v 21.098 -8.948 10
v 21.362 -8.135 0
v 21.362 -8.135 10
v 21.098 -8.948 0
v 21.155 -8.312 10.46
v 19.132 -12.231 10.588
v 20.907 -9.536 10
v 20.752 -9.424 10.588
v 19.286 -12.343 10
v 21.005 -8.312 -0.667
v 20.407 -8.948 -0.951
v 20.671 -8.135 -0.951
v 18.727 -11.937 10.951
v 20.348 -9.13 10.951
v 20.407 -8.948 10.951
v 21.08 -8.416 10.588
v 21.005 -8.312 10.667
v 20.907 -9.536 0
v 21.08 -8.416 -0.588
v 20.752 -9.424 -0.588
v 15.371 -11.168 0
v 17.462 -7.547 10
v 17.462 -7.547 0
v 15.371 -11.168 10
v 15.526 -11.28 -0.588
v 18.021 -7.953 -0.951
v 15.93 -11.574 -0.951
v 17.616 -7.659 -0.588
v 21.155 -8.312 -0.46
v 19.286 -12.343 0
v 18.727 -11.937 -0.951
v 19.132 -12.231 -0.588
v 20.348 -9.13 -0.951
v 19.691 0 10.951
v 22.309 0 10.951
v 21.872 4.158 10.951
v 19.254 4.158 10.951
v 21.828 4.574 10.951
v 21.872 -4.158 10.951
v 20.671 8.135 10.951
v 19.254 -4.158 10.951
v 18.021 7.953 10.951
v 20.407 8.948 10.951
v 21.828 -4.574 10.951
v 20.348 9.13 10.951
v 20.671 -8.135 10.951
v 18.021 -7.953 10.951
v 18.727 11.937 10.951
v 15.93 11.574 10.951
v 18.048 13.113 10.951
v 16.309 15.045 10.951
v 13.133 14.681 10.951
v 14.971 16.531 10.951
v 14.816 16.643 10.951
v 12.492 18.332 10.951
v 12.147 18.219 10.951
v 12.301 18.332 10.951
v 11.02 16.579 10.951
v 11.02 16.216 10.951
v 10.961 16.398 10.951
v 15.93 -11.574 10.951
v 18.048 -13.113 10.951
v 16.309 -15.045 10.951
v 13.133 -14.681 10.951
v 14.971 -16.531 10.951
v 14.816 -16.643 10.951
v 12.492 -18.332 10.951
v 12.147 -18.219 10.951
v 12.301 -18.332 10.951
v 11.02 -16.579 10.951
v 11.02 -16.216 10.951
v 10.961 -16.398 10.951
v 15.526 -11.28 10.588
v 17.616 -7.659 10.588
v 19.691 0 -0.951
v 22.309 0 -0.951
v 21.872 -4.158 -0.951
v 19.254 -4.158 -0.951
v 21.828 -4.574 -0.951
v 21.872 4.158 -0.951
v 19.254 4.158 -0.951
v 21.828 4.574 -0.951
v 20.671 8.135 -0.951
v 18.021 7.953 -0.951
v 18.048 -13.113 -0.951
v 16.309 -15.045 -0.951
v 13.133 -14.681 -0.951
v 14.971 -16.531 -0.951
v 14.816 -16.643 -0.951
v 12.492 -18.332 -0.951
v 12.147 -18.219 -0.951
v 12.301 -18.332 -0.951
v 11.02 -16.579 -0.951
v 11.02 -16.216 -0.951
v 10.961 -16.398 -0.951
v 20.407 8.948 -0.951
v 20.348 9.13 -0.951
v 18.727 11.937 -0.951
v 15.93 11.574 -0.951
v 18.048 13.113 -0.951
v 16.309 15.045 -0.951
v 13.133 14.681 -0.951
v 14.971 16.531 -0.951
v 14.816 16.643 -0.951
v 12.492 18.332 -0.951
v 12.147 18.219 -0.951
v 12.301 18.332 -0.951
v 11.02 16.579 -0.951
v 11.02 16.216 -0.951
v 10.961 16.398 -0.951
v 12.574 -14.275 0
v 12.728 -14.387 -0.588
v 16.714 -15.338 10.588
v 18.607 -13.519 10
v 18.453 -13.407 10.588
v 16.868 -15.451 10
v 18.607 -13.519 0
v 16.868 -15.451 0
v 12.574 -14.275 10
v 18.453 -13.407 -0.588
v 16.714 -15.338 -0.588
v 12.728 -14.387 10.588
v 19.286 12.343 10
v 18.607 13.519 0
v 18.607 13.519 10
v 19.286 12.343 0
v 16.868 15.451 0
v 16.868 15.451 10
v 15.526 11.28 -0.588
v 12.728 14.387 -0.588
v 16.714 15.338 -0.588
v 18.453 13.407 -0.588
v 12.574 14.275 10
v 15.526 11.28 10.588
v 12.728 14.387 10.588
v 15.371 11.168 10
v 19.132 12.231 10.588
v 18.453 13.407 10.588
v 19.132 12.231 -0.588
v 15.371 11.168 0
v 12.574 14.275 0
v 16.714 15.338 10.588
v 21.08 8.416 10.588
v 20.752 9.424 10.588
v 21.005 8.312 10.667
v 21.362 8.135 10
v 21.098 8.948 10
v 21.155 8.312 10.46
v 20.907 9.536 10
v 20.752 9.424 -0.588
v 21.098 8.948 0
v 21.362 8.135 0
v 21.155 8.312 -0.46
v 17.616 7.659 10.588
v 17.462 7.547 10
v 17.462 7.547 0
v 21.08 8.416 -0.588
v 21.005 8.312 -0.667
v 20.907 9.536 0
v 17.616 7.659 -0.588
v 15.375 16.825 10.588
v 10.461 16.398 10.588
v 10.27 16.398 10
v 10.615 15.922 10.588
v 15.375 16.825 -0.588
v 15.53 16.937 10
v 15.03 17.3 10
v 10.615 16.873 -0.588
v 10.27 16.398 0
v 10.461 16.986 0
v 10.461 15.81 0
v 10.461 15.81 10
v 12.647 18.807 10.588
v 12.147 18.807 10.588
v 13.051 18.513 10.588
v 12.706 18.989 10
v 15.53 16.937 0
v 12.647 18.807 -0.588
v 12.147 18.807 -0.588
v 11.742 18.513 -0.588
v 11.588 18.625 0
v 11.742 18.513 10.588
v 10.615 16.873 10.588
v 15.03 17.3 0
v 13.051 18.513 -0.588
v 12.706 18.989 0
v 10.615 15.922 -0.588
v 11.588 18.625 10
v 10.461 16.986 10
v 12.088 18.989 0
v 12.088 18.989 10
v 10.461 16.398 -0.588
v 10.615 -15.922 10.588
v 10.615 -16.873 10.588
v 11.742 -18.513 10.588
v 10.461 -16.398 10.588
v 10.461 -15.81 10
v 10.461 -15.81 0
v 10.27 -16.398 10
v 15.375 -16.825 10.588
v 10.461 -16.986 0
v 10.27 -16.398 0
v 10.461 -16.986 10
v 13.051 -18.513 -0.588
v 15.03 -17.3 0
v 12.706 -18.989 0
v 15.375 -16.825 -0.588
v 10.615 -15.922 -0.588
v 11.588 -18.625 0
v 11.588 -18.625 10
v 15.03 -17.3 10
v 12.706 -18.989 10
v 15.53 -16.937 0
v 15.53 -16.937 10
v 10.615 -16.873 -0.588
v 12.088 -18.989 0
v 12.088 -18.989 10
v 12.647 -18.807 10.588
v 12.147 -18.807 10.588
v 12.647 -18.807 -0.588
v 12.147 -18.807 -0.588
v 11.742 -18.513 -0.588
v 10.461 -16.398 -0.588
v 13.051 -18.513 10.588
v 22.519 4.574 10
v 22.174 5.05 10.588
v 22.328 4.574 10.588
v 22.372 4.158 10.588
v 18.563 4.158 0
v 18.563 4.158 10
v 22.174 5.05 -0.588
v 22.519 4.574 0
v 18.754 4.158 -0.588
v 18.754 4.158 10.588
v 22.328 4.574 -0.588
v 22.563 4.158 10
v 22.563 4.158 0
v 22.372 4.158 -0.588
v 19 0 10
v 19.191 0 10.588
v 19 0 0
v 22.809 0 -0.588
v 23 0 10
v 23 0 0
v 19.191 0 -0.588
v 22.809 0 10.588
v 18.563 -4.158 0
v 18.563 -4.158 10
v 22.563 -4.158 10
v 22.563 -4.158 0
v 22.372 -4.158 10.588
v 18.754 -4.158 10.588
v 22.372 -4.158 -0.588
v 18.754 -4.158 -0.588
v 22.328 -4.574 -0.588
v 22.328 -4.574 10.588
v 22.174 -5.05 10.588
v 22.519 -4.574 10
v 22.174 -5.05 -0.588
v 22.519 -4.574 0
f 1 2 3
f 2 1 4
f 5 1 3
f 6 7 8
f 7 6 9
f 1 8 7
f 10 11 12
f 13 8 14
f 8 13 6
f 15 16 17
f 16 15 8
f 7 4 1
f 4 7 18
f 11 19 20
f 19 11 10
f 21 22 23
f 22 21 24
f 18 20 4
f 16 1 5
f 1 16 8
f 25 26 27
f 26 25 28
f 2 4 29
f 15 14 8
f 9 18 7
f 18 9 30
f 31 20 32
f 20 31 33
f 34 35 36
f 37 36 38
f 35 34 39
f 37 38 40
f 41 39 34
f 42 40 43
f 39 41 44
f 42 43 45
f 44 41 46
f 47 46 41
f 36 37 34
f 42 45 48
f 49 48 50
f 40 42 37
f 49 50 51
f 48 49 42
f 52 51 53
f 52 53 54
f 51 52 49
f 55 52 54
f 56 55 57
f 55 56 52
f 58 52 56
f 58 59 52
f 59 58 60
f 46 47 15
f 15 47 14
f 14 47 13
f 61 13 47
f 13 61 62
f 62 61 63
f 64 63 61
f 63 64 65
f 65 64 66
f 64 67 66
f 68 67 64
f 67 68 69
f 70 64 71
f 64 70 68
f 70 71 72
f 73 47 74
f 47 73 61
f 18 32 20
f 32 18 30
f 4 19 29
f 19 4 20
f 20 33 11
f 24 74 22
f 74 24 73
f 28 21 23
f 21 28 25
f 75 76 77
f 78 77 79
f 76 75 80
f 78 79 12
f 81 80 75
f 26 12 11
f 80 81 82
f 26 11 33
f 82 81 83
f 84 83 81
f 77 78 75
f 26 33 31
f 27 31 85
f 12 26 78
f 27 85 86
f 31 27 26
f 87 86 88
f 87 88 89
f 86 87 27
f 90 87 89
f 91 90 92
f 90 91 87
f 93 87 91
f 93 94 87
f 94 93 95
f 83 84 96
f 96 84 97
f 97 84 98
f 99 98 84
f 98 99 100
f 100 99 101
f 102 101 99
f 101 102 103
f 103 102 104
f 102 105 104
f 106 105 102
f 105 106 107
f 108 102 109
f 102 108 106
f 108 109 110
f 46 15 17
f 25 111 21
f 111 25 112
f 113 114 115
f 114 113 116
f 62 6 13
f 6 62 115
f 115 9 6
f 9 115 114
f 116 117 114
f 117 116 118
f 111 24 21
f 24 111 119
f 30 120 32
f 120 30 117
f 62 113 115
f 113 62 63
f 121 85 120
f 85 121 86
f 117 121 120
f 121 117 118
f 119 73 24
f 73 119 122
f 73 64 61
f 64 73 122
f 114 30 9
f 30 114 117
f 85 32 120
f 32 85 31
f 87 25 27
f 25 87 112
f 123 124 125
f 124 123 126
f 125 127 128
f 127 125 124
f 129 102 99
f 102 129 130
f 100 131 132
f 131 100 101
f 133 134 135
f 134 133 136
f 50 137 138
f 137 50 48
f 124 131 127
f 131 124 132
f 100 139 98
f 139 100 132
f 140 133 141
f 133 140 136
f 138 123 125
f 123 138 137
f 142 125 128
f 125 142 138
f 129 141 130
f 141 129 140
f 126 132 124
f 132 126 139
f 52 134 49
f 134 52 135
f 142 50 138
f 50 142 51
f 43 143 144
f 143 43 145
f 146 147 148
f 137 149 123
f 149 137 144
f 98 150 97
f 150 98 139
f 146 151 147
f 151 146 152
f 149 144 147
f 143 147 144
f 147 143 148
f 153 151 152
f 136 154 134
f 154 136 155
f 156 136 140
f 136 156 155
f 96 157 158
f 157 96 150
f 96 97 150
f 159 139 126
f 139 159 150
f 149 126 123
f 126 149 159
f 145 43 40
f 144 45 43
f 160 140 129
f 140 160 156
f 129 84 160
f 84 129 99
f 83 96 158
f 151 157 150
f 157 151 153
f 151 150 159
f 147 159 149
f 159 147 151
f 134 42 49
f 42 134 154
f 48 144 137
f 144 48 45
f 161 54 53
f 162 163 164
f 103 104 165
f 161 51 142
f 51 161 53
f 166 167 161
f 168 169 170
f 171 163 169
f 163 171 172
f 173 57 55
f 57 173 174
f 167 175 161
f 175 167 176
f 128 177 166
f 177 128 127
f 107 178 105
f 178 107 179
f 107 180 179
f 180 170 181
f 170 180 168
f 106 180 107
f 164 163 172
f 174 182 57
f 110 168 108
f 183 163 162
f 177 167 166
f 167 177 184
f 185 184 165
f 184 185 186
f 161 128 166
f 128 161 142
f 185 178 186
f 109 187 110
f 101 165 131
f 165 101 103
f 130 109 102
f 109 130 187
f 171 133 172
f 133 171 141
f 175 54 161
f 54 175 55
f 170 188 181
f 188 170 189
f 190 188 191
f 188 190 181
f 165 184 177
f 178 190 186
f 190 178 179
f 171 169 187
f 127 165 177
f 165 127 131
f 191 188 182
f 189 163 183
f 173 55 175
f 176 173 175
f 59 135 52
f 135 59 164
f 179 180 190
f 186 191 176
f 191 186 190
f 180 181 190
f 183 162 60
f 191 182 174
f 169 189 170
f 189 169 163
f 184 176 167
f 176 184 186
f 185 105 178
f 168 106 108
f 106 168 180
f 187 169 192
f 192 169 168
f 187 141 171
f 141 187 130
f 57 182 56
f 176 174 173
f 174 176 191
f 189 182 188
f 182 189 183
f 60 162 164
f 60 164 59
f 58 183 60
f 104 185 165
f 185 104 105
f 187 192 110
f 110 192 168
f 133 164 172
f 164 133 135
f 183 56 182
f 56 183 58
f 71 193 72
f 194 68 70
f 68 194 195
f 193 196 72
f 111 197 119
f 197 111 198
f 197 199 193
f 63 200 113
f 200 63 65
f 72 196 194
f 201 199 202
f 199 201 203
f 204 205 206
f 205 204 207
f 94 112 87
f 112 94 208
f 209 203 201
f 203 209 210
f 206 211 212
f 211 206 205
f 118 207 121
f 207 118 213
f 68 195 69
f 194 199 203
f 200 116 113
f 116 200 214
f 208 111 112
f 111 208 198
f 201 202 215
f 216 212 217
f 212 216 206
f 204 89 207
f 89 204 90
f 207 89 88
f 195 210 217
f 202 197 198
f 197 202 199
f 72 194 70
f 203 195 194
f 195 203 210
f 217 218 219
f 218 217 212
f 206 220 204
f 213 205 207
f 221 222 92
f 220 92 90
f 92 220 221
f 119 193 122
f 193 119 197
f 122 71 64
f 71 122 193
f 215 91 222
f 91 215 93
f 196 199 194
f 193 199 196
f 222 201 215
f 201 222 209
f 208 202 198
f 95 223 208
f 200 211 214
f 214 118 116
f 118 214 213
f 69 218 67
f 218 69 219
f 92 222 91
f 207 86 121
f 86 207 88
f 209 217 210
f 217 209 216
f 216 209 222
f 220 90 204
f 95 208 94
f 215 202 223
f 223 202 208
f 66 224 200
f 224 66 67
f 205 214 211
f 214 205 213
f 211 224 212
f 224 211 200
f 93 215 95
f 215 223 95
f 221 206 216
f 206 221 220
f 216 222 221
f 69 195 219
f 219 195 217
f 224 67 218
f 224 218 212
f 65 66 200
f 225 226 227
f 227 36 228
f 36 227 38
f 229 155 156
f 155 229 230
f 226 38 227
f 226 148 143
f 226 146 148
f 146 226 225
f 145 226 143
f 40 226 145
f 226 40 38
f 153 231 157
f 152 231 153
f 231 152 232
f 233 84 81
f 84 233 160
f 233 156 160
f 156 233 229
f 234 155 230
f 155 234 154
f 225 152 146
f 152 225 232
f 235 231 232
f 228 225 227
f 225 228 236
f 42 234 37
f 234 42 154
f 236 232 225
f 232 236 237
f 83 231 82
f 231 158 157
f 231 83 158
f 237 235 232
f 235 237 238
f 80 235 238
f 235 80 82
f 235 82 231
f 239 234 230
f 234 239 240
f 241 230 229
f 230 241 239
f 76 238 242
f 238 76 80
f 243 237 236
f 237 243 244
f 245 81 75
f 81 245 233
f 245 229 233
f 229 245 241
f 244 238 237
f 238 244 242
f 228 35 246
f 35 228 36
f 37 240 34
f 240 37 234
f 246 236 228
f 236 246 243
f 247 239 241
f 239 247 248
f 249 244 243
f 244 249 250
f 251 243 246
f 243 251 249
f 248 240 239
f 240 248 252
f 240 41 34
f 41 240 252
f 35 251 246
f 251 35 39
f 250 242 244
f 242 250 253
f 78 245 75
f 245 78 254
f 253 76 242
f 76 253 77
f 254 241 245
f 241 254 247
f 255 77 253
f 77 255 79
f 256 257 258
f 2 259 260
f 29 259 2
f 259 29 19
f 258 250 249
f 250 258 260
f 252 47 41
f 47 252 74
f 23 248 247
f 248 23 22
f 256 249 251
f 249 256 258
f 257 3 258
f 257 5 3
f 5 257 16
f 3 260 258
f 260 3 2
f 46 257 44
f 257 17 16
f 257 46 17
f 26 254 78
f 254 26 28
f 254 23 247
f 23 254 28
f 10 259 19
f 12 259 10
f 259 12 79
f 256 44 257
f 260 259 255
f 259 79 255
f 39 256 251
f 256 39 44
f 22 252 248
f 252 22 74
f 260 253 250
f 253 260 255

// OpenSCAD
// file: ../../../../../external-resources/geometry/arc/chickenchuck040/arc.scad
// This arc module is from this thing on Thingiverse:
//		https://www.thingiverse.com/thing:1092611

module arc(radius, thick, angle)
{
	intersection()
	{
		union()
		{
			rights = floor(angle/90);
			remain = angle-rights*90;
			if(angle > 90)
			{
				for(i = [0:rights-1]){
					rotate(i*90-(rights-1)*90/2){
						polygon([[0, 0], [radius+thick, (radius+thick)*tan(90/2)], [radius+thick, -(radius+thick)*tan(90/2)]]);
					}
				}
				rotate(-(rights)*90/2)
					polygon([[0, 0], [radius+thick, 0], [radius+thick, -(radius+thick)*tan(remain/2)]]);
				rotate((rights)*90/2)
					polygon([[0, 0], [radius+thick, (radius+thick)*tan(remain/2)], [radius+thick, 0]]);
			}
			else
			{
				polygon([[0, 0], [radius+thick, (radius+thick)*tan(angle/2)], [radius+thick, -(radius+thick)*tan(angle/2)]]);
			}
		}
		difference(){
			circle(radius+thick);
			circle(radius);
		}
	}
}

//arc(10, 3, 300);
// file: ../extruded-arc.scad
use <../../../../external-resources/geometry/arc/chickenchuck040/arc.scad>

module rectangularArc(radius, radiusExtension, angle, height)
{
    linear_extrude(height = height)
    arc(radius = radius,
        thick = radiusExtension,
        angle = angle);
}

module roundedRectangularArc(angle = 111,
                             height = 10,
                             radius = 20, 
                             radiusExtension = 2,
                             minkowskiFn = 10,
                             minkowskiRadius = 1)
{
    minkowski()
    {    
        rectangularArc(angle = angle,
                    height = height,
                    radius = radius,
                    radiusExtension = radiusExtension);

        sphere(r = minkowskiRadius, $fn = minkowskiFn);
    }
}
// main file
use <../extruded-arc.scad>

roundedRectangularArc(angle = 111,
                      height = 10,
                      radius = 20, 
                      radiusExtension = 2,
                      minkowskiFn = 10,
                      minkowskiRadius = 1);
